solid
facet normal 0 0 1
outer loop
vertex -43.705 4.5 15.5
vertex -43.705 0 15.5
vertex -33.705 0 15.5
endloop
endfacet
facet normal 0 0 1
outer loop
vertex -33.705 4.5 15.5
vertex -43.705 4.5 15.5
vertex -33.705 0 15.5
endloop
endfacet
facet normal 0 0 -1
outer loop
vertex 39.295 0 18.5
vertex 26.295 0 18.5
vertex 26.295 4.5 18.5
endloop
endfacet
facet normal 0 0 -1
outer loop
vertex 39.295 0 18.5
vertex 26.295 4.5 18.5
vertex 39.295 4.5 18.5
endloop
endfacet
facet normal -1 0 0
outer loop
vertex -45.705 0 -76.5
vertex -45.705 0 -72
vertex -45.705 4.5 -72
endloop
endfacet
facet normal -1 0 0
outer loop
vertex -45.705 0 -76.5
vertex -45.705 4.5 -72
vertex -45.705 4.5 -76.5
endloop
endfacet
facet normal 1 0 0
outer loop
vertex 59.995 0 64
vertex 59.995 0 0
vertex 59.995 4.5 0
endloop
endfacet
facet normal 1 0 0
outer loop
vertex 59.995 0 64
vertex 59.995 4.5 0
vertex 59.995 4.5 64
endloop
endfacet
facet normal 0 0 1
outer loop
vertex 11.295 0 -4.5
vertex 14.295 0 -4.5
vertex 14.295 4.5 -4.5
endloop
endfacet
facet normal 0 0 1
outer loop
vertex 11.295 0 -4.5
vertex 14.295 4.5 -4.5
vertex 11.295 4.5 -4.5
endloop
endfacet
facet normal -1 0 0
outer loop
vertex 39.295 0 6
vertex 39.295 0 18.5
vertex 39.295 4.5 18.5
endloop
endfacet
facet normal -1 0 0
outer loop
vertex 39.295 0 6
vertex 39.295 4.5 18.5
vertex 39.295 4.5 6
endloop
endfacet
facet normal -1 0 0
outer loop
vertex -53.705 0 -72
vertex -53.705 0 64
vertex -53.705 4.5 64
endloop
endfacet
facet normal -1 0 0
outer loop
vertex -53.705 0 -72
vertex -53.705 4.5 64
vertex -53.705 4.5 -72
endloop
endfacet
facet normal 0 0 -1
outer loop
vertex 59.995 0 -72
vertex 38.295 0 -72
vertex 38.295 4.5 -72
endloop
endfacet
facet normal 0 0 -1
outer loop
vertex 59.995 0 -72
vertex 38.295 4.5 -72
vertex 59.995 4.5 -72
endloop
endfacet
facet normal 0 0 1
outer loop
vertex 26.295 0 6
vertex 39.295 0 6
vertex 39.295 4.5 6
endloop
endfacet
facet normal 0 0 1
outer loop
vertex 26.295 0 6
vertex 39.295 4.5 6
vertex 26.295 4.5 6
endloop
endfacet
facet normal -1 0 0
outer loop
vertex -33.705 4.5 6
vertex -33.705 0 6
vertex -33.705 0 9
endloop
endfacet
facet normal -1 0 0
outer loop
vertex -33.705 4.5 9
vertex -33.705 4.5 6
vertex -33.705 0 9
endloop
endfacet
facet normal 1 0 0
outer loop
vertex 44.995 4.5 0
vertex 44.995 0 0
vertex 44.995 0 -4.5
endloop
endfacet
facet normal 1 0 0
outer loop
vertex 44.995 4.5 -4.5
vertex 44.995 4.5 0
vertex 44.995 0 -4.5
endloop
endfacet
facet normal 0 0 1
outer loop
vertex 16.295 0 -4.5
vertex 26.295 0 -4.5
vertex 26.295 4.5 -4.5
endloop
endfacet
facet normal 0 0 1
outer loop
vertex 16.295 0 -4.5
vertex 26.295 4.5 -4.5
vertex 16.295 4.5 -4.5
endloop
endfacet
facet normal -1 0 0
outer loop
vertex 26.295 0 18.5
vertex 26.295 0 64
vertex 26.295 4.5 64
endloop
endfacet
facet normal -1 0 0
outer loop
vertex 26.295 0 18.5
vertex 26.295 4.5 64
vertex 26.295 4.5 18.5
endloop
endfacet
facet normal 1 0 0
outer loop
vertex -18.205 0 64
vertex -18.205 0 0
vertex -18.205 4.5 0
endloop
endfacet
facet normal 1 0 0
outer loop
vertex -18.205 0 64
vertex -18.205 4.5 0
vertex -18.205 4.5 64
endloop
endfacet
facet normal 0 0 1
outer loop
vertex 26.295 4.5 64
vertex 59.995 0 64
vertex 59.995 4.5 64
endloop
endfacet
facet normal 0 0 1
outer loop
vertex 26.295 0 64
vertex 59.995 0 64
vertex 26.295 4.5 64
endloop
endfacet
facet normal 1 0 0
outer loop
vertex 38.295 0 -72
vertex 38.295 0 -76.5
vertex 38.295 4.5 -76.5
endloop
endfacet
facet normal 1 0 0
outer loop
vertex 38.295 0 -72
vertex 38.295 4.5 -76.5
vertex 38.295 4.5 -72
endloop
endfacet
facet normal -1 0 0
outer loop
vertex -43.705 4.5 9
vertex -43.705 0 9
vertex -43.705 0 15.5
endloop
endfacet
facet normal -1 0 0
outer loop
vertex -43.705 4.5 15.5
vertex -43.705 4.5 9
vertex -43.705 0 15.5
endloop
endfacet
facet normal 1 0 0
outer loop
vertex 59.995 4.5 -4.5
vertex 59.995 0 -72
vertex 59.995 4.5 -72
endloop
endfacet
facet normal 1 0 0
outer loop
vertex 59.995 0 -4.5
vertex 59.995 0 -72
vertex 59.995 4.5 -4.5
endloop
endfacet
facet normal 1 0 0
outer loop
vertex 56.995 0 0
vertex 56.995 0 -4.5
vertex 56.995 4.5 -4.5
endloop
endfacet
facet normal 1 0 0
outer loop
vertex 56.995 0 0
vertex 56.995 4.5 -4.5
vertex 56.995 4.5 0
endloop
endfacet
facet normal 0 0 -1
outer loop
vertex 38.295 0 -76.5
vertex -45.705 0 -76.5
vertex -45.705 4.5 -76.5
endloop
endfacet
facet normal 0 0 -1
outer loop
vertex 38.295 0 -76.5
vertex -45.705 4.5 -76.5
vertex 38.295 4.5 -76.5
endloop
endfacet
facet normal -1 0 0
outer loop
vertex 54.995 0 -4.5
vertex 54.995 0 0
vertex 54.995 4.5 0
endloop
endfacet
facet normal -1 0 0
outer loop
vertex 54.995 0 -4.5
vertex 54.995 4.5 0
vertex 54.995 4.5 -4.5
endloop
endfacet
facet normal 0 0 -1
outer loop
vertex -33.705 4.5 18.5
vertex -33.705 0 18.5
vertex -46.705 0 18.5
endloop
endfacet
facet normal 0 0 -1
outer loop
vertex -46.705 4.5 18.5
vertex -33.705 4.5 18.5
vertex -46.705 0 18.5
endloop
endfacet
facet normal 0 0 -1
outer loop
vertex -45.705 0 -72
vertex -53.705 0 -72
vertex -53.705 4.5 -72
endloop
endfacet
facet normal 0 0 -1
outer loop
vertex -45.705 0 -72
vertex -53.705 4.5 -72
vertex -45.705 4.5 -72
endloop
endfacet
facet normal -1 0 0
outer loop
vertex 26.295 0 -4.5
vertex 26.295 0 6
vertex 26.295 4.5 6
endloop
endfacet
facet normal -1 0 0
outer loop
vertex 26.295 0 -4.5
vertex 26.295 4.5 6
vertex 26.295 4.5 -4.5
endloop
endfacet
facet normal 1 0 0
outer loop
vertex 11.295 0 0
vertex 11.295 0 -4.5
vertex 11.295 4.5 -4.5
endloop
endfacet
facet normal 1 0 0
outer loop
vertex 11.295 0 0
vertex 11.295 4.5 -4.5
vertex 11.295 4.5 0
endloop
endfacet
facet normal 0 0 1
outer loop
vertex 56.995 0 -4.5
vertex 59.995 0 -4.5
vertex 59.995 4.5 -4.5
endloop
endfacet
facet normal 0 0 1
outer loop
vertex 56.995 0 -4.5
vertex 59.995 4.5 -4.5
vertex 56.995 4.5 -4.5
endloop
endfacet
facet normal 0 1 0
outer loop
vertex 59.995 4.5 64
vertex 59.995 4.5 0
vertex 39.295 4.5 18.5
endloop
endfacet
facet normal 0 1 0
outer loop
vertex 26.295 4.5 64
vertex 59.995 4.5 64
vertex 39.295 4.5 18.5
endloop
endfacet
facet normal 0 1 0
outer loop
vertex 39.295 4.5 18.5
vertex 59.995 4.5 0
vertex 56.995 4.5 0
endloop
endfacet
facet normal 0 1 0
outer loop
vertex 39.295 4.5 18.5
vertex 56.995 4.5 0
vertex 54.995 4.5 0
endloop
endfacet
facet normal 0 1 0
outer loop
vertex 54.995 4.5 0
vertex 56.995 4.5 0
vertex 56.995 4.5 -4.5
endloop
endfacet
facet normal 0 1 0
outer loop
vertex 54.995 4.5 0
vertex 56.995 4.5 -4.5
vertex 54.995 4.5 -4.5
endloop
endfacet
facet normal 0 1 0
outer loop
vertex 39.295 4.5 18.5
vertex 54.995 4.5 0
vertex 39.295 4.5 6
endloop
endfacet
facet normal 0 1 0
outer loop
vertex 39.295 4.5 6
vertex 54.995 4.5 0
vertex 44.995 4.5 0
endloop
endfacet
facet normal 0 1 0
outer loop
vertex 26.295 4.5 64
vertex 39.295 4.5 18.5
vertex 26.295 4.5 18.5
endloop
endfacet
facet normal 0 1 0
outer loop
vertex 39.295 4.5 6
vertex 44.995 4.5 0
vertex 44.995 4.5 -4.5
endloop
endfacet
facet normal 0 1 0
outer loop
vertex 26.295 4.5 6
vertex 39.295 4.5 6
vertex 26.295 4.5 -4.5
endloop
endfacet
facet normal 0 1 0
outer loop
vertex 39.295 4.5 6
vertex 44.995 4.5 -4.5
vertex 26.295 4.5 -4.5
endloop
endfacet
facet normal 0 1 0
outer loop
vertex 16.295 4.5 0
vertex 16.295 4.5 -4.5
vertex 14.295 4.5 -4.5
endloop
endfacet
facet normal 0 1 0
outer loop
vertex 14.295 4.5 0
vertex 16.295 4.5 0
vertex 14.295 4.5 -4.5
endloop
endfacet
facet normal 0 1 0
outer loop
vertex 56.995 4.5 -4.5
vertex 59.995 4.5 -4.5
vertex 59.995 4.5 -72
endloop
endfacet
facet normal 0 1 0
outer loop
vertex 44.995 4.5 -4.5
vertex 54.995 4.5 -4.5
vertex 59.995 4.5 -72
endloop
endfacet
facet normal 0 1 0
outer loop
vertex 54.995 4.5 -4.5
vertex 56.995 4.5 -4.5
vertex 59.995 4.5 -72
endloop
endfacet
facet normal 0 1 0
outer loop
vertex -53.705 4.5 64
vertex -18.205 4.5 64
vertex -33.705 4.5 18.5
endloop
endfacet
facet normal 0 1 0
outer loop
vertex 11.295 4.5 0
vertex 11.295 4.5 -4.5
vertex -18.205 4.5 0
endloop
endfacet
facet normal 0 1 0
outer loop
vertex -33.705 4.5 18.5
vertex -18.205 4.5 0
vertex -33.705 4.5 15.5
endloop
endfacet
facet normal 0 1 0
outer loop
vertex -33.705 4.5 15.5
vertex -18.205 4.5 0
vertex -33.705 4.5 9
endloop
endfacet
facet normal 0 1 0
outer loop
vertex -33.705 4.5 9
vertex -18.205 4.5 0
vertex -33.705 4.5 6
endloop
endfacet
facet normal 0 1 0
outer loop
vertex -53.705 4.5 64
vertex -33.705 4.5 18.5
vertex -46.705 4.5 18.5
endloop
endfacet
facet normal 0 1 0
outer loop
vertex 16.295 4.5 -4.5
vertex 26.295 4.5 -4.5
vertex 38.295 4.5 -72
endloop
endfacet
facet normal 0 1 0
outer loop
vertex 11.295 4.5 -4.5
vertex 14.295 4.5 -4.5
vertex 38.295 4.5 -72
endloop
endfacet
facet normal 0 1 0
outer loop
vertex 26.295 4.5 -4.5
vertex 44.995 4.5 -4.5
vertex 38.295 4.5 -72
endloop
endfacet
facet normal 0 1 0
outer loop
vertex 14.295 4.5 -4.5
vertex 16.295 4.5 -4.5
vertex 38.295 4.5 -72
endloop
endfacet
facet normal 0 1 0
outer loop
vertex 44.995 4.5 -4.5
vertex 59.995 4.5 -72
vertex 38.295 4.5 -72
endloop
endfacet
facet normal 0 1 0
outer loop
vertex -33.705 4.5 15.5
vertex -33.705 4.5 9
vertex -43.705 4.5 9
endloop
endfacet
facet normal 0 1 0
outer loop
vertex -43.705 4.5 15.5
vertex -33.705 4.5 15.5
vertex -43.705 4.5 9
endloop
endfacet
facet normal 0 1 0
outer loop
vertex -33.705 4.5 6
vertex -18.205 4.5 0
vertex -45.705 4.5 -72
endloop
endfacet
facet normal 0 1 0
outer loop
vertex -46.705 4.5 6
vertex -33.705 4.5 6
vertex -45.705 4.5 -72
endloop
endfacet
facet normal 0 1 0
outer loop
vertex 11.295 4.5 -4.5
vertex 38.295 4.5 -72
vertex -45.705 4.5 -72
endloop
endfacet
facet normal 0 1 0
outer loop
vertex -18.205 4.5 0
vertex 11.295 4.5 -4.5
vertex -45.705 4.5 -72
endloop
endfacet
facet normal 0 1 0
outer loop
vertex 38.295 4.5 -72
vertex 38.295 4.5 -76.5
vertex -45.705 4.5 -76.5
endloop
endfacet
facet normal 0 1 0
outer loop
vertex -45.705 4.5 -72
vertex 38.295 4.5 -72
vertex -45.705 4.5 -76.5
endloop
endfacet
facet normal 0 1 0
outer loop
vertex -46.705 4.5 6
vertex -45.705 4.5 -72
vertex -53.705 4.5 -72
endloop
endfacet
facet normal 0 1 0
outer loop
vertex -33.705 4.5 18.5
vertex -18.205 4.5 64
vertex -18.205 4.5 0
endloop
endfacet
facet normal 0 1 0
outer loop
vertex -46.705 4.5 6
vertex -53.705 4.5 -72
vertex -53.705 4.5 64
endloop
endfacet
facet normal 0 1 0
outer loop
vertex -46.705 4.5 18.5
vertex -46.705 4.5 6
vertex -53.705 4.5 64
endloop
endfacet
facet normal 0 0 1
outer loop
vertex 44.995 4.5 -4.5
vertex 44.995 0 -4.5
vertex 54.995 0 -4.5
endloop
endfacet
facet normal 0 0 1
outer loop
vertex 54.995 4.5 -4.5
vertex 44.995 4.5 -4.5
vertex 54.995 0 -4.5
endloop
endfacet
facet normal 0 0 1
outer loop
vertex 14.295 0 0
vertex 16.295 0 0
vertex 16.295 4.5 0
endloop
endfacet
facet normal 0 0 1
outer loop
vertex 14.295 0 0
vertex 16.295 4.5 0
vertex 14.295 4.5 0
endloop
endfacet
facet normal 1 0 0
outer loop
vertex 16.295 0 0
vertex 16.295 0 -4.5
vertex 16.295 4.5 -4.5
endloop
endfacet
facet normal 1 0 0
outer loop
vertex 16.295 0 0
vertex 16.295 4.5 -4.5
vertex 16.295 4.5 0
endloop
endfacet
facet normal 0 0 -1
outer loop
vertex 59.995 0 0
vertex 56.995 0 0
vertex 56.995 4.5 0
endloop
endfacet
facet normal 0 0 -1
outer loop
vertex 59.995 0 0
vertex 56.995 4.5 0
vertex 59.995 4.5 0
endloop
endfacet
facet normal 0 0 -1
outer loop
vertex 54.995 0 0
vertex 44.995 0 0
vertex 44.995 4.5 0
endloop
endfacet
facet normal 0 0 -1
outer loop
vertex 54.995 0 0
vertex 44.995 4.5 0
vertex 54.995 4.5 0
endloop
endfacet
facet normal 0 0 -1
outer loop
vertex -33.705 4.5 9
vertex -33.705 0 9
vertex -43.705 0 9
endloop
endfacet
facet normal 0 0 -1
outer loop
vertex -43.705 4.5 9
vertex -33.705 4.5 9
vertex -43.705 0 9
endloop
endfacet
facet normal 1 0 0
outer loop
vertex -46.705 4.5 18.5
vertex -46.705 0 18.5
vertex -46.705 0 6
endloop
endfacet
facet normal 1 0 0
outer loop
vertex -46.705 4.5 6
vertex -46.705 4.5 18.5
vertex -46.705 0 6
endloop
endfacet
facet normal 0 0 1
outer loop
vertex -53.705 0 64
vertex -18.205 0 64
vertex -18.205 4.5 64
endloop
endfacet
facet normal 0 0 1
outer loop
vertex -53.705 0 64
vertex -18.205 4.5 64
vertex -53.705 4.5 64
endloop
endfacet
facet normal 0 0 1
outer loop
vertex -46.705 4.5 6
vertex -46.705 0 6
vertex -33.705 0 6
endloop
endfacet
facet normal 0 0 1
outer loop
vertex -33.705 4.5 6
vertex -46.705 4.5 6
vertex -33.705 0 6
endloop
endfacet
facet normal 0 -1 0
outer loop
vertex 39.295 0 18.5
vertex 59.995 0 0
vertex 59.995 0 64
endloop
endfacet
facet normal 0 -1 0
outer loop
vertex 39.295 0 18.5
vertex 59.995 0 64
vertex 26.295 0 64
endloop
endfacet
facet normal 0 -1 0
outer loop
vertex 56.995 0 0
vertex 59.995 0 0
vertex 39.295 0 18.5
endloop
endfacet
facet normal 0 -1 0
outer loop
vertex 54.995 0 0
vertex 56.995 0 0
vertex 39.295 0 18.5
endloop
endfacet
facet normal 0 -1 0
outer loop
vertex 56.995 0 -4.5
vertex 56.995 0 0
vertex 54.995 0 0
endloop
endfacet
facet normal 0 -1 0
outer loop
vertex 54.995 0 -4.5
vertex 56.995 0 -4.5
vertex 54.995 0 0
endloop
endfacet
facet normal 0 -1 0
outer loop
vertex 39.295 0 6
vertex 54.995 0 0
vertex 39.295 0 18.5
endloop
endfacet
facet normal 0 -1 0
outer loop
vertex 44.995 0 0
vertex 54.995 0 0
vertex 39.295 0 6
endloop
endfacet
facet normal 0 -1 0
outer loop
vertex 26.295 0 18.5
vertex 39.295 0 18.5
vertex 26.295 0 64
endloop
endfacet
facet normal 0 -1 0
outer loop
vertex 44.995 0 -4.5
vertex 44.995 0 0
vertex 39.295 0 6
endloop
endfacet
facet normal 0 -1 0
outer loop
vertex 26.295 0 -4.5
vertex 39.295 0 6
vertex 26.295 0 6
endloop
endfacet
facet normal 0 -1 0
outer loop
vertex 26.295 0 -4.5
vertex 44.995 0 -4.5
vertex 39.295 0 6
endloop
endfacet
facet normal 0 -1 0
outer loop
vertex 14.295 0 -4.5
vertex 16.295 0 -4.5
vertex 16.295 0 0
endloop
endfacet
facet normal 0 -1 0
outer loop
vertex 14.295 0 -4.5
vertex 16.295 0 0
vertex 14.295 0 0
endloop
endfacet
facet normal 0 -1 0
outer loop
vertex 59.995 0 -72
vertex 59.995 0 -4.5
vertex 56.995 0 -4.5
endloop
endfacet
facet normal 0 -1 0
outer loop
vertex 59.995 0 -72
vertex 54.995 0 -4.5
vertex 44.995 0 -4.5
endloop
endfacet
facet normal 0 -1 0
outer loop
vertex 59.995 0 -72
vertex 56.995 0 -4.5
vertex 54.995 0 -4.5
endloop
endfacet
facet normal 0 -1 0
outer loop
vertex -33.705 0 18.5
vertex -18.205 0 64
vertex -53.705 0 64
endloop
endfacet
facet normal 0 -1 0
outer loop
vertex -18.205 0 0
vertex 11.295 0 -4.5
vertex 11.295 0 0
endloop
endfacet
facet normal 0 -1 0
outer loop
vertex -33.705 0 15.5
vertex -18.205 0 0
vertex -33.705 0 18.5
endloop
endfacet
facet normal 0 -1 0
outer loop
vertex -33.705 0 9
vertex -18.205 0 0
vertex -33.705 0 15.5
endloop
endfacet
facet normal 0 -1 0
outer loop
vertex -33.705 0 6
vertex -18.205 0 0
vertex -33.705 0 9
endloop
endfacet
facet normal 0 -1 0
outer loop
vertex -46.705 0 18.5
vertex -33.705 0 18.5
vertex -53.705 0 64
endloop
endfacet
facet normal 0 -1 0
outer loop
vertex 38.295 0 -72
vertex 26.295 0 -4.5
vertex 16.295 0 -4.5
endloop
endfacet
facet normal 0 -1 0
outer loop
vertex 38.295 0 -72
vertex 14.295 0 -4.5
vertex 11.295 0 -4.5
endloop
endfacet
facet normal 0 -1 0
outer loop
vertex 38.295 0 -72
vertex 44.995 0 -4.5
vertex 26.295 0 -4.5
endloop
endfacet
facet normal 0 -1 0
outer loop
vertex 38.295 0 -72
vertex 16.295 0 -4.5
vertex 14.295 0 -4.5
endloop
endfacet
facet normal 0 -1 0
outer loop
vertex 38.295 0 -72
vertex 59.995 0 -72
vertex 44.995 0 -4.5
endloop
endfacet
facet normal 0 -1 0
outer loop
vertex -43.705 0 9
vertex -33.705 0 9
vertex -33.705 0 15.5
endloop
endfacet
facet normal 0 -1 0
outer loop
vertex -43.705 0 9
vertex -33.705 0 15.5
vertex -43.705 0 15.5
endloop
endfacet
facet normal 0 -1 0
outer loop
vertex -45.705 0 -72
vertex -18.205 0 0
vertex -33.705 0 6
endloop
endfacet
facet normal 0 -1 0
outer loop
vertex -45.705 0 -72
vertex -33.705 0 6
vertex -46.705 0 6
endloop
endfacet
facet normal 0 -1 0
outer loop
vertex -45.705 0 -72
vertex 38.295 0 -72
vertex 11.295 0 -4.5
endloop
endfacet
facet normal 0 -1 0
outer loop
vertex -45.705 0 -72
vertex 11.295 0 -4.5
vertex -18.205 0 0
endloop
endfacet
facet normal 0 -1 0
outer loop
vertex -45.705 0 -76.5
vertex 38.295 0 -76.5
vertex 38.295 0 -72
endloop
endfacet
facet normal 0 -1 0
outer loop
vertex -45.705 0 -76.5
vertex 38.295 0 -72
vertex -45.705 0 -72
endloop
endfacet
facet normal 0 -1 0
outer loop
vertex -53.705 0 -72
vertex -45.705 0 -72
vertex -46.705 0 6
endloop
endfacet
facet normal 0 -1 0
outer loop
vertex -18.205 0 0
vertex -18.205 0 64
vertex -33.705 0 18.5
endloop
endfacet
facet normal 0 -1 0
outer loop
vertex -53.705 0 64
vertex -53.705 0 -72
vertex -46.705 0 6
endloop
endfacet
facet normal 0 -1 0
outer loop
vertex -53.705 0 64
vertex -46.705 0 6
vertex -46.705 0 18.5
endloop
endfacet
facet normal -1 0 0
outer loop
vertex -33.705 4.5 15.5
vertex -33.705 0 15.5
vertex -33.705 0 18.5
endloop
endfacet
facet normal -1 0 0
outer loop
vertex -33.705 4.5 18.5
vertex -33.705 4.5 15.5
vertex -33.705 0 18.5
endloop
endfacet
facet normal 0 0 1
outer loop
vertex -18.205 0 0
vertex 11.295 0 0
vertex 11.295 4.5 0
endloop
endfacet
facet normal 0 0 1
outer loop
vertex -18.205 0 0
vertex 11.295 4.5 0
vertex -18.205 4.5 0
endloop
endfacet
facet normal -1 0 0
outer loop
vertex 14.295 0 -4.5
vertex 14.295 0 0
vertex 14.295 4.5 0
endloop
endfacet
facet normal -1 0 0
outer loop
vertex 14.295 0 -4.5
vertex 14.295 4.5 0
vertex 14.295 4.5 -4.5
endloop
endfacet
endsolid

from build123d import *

# Parameters (mm, degrees)
SKETCH2_W           = 10
SKETCH2_H           = 4.5
BOSS_EXTRUDE1_DEPTH = 4.5


with BuildPart() as part:
    # Sketch2 → Boss-Extrude1 (new body)
    with BuildSketch(Plane(origin=(0, 0, 0), x_dir=(1, 0, 0), z_dir=(0, 1, 0))):
        Polygon((11.295466324, 4.5), (11.295466324, 0), (-18.204533676, 0), (-18.204533676, -64), (-53.704533676, -64), (-53.704533676, 72), (-45.704533676, 72), (-45.704533676, 76.5), (38.295466324, 76.5), (38.295466324, 72), (59.995466324, 72), (59.995466324, 4.5), (56.995466324, 4.5), (56.995466324, 0), (59.995466324, 0), (59.995466324, -64), (26.295466324, -64), (26.295466324, -18.5), (39.295466324, -18.5), (39.295466324, -6), (26.295466324, -6), (26.295466324, 4.5), (16.295466324, 4.5), (16.295466324, 0), (14.295466324, 0), (14.295466324, 4.5), align=None)
        with Locations((49.995466324, 2.25)):
            Rectangle(SKETCH2_W, SKETCH2_H, mode=Mode.SUBTRACT)
        Polygon((-33.704533676, -15.5), (-33.704533676, -18.5), (-46.704533676, -18.5), (-46.704533676, -6), (-33.704533676, -6), (-33.704533676, -9), (-43.704533676, -9), (-43.704533676, -15.5), align=None, mode=Mode.SUBTRACT)
    extrude(amount=BOSS_EXTRUDE1_DEPTH)


solid = part.part
